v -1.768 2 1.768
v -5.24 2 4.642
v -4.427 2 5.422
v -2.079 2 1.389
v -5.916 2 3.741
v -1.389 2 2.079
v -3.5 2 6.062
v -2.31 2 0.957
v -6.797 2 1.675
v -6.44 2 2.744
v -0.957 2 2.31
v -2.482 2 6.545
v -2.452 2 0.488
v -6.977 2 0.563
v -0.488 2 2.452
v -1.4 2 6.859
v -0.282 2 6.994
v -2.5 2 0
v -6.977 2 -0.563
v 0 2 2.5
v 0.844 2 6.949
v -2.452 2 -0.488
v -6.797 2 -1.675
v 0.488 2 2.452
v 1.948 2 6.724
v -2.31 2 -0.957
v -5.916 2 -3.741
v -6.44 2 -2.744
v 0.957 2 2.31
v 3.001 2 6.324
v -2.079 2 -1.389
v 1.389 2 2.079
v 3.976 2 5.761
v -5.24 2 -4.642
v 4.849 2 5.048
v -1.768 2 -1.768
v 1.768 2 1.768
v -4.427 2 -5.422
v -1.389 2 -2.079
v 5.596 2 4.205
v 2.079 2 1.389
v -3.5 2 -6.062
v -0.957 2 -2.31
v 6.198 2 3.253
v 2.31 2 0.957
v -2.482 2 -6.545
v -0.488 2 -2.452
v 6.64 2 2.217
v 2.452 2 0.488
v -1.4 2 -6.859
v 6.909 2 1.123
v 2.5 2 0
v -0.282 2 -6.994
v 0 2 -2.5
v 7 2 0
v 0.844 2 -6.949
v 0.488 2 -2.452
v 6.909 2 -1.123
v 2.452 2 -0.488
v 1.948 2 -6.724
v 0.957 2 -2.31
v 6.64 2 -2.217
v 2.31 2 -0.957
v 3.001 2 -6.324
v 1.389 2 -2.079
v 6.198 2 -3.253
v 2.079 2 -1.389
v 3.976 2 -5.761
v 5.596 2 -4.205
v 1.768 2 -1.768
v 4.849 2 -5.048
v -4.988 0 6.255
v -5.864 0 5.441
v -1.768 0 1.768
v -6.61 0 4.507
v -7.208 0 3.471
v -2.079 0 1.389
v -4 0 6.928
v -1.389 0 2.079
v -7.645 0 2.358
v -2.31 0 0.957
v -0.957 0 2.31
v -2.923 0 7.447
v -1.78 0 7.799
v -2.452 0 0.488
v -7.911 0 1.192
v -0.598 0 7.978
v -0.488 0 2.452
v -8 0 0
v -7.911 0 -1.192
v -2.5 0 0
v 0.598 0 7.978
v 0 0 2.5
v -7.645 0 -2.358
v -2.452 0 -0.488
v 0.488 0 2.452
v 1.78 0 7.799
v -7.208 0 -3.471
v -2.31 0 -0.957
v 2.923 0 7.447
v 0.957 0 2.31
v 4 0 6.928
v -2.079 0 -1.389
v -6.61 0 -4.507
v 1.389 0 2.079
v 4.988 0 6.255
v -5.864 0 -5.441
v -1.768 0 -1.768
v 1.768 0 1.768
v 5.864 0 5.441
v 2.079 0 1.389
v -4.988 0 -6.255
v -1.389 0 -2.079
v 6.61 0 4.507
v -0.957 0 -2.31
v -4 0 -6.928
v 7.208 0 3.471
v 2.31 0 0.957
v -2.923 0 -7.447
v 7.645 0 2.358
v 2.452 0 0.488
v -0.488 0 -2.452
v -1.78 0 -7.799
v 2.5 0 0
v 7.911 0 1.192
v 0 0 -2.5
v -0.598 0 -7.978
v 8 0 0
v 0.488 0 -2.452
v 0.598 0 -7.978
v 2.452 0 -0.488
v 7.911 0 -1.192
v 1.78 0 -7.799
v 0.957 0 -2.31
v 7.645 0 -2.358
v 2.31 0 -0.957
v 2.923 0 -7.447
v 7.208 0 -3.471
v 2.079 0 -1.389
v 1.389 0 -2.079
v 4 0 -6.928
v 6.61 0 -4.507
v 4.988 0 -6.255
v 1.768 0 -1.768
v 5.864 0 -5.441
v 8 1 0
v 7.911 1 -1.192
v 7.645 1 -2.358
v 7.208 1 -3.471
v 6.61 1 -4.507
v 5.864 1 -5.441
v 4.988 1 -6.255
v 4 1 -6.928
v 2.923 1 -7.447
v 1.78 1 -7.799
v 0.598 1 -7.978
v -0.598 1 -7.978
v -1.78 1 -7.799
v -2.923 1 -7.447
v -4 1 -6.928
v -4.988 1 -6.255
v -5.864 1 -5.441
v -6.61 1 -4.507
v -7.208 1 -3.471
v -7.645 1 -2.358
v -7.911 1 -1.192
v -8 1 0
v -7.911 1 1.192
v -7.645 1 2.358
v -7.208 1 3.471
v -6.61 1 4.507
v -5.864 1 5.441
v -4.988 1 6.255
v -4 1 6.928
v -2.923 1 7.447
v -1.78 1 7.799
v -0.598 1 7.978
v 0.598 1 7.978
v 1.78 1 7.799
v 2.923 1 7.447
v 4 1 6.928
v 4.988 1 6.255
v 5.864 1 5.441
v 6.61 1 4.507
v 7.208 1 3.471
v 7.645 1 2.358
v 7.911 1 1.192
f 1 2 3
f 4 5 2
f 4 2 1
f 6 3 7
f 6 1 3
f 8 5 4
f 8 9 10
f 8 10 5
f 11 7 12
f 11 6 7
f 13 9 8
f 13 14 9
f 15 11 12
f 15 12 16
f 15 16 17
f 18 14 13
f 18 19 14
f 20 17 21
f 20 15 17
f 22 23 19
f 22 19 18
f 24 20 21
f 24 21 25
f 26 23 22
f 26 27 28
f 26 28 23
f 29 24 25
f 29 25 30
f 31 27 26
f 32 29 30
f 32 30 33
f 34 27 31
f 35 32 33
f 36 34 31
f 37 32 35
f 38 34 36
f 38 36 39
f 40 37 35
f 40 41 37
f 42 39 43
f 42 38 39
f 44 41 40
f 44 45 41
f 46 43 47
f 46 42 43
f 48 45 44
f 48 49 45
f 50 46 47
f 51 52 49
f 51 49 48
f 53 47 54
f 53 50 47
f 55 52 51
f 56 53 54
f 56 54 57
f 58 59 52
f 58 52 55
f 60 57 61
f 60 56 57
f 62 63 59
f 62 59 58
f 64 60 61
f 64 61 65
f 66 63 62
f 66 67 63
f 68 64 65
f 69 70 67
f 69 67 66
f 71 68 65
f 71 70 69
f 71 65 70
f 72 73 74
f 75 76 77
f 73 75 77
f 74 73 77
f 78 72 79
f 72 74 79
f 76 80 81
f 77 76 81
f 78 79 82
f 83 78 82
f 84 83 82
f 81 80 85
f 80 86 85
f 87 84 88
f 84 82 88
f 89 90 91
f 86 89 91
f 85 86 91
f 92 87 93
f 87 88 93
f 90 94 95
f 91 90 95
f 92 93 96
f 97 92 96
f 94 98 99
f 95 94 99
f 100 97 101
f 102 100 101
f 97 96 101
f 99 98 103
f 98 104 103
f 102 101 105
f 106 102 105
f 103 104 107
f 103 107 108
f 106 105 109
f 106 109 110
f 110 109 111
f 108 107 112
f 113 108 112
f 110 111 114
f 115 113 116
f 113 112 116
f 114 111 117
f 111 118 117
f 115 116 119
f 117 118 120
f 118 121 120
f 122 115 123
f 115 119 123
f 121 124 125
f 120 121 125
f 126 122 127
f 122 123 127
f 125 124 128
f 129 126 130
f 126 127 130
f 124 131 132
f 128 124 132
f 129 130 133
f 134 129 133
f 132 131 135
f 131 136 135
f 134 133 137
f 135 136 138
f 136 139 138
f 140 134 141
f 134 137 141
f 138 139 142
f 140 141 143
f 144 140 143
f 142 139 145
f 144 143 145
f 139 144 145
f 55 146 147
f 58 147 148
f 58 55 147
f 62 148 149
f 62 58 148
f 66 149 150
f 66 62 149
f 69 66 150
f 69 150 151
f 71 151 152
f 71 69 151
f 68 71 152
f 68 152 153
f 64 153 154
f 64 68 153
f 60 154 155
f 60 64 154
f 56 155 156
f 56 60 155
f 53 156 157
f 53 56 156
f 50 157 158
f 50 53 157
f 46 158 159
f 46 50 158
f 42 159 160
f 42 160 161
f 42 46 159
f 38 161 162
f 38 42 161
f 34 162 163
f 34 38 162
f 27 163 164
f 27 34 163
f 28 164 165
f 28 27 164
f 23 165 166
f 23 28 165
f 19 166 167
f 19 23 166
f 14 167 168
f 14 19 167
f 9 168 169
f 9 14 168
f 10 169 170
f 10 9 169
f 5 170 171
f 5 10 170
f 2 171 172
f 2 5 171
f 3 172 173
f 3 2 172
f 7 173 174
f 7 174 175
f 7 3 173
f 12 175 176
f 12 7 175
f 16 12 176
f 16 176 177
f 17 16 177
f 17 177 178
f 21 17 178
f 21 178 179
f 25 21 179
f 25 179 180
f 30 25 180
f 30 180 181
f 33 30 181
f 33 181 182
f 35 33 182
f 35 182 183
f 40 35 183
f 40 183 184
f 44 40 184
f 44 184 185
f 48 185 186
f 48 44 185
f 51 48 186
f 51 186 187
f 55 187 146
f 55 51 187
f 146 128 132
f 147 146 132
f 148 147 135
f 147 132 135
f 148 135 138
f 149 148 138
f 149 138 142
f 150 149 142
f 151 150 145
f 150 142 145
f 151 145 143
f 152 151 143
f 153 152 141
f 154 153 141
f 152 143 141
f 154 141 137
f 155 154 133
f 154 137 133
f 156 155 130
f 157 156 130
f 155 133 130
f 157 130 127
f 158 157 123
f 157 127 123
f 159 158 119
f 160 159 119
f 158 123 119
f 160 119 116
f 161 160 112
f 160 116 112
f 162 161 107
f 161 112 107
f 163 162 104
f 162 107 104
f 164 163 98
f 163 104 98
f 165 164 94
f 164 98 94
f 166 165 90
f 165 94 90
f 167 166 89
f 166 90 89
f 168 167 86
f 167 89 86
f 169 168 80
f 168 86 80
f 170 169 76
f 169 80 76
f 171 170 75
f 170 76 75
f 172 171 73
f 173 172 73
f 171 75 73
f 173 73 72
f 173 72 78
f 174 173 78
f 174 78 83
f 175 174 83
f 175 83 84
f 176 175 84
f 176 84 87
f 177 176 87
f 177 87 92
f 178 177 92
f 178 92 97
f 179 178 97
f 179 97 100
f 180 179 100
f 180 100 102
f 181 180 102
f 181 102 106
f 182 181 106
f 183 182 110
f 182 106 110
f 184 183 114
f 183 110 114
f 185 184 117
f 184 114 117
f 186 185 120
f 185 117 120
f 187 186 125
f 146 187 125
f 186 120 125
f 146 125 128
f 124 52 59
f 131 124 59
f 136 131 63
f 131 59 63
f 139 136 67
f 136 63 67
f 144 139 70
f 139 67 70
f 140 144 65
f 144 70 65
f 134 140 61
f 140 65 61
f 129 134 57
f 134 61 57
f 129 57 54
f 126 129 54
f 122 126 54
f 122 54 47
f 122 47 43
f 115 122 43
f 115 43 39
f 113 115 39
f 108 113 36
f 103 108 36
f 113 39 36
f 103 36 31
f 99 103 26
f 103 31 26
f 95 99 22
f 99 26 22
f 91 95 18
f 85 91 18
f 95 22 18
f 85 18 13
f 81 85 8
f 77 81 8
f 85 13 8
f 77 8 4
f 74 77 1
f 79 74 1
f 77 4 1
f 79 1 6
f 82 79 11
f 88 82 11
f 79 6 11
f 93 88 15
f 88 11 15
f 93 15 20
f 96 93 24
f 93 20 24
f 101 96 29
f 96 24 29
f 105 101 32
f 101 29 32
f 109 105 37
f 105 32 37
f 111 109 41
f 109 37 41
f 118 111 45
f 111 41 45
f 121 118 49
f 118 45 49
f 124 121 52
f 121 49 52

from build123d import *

# Parameters (mm, degrees)
SKETCH1_R           = 8
BOSS_EXTRUDE1_DEPTH = 2
CHAMFER1_SIZE       = 1
SKETCH2_R           = 2.5
CUT_EXTRUDE1_DEPTH  = 2


with BuildPart() as part:
    # Sketch1 → Boss-Extrude1 (new body)
    with BuildSketch(Plane(origin=(0, 0, 0), x_dir=(1, 0, 0), z_dir=(0, 1, 0))):
        Circle(SKETCH1_R)
    extrude(amount=BOSS_EXTRUDE1_DEPTH)

    # Chamfer1
    chamfer1_edges = [part.edges().sort_by_distance(p)[0] for p in [
        (-8, 2, 0),
    ]]
    chamfer(chamfer1_edges, length=CHAMFER1_SIZE)

    # Sketch2 → Cut-Extrude1 (cut)
    with BuildSketch(Plane(origin=(0, 2, 0), x_dir=(1, 0, 0), z_dir=(0, 1, 0))):
        Circle(SKETCH2_R)
    extrude(amount=-CUT_EXTRUDE1_DEPTH, mode=Mode.SUBTRACT)


solid = part.part
